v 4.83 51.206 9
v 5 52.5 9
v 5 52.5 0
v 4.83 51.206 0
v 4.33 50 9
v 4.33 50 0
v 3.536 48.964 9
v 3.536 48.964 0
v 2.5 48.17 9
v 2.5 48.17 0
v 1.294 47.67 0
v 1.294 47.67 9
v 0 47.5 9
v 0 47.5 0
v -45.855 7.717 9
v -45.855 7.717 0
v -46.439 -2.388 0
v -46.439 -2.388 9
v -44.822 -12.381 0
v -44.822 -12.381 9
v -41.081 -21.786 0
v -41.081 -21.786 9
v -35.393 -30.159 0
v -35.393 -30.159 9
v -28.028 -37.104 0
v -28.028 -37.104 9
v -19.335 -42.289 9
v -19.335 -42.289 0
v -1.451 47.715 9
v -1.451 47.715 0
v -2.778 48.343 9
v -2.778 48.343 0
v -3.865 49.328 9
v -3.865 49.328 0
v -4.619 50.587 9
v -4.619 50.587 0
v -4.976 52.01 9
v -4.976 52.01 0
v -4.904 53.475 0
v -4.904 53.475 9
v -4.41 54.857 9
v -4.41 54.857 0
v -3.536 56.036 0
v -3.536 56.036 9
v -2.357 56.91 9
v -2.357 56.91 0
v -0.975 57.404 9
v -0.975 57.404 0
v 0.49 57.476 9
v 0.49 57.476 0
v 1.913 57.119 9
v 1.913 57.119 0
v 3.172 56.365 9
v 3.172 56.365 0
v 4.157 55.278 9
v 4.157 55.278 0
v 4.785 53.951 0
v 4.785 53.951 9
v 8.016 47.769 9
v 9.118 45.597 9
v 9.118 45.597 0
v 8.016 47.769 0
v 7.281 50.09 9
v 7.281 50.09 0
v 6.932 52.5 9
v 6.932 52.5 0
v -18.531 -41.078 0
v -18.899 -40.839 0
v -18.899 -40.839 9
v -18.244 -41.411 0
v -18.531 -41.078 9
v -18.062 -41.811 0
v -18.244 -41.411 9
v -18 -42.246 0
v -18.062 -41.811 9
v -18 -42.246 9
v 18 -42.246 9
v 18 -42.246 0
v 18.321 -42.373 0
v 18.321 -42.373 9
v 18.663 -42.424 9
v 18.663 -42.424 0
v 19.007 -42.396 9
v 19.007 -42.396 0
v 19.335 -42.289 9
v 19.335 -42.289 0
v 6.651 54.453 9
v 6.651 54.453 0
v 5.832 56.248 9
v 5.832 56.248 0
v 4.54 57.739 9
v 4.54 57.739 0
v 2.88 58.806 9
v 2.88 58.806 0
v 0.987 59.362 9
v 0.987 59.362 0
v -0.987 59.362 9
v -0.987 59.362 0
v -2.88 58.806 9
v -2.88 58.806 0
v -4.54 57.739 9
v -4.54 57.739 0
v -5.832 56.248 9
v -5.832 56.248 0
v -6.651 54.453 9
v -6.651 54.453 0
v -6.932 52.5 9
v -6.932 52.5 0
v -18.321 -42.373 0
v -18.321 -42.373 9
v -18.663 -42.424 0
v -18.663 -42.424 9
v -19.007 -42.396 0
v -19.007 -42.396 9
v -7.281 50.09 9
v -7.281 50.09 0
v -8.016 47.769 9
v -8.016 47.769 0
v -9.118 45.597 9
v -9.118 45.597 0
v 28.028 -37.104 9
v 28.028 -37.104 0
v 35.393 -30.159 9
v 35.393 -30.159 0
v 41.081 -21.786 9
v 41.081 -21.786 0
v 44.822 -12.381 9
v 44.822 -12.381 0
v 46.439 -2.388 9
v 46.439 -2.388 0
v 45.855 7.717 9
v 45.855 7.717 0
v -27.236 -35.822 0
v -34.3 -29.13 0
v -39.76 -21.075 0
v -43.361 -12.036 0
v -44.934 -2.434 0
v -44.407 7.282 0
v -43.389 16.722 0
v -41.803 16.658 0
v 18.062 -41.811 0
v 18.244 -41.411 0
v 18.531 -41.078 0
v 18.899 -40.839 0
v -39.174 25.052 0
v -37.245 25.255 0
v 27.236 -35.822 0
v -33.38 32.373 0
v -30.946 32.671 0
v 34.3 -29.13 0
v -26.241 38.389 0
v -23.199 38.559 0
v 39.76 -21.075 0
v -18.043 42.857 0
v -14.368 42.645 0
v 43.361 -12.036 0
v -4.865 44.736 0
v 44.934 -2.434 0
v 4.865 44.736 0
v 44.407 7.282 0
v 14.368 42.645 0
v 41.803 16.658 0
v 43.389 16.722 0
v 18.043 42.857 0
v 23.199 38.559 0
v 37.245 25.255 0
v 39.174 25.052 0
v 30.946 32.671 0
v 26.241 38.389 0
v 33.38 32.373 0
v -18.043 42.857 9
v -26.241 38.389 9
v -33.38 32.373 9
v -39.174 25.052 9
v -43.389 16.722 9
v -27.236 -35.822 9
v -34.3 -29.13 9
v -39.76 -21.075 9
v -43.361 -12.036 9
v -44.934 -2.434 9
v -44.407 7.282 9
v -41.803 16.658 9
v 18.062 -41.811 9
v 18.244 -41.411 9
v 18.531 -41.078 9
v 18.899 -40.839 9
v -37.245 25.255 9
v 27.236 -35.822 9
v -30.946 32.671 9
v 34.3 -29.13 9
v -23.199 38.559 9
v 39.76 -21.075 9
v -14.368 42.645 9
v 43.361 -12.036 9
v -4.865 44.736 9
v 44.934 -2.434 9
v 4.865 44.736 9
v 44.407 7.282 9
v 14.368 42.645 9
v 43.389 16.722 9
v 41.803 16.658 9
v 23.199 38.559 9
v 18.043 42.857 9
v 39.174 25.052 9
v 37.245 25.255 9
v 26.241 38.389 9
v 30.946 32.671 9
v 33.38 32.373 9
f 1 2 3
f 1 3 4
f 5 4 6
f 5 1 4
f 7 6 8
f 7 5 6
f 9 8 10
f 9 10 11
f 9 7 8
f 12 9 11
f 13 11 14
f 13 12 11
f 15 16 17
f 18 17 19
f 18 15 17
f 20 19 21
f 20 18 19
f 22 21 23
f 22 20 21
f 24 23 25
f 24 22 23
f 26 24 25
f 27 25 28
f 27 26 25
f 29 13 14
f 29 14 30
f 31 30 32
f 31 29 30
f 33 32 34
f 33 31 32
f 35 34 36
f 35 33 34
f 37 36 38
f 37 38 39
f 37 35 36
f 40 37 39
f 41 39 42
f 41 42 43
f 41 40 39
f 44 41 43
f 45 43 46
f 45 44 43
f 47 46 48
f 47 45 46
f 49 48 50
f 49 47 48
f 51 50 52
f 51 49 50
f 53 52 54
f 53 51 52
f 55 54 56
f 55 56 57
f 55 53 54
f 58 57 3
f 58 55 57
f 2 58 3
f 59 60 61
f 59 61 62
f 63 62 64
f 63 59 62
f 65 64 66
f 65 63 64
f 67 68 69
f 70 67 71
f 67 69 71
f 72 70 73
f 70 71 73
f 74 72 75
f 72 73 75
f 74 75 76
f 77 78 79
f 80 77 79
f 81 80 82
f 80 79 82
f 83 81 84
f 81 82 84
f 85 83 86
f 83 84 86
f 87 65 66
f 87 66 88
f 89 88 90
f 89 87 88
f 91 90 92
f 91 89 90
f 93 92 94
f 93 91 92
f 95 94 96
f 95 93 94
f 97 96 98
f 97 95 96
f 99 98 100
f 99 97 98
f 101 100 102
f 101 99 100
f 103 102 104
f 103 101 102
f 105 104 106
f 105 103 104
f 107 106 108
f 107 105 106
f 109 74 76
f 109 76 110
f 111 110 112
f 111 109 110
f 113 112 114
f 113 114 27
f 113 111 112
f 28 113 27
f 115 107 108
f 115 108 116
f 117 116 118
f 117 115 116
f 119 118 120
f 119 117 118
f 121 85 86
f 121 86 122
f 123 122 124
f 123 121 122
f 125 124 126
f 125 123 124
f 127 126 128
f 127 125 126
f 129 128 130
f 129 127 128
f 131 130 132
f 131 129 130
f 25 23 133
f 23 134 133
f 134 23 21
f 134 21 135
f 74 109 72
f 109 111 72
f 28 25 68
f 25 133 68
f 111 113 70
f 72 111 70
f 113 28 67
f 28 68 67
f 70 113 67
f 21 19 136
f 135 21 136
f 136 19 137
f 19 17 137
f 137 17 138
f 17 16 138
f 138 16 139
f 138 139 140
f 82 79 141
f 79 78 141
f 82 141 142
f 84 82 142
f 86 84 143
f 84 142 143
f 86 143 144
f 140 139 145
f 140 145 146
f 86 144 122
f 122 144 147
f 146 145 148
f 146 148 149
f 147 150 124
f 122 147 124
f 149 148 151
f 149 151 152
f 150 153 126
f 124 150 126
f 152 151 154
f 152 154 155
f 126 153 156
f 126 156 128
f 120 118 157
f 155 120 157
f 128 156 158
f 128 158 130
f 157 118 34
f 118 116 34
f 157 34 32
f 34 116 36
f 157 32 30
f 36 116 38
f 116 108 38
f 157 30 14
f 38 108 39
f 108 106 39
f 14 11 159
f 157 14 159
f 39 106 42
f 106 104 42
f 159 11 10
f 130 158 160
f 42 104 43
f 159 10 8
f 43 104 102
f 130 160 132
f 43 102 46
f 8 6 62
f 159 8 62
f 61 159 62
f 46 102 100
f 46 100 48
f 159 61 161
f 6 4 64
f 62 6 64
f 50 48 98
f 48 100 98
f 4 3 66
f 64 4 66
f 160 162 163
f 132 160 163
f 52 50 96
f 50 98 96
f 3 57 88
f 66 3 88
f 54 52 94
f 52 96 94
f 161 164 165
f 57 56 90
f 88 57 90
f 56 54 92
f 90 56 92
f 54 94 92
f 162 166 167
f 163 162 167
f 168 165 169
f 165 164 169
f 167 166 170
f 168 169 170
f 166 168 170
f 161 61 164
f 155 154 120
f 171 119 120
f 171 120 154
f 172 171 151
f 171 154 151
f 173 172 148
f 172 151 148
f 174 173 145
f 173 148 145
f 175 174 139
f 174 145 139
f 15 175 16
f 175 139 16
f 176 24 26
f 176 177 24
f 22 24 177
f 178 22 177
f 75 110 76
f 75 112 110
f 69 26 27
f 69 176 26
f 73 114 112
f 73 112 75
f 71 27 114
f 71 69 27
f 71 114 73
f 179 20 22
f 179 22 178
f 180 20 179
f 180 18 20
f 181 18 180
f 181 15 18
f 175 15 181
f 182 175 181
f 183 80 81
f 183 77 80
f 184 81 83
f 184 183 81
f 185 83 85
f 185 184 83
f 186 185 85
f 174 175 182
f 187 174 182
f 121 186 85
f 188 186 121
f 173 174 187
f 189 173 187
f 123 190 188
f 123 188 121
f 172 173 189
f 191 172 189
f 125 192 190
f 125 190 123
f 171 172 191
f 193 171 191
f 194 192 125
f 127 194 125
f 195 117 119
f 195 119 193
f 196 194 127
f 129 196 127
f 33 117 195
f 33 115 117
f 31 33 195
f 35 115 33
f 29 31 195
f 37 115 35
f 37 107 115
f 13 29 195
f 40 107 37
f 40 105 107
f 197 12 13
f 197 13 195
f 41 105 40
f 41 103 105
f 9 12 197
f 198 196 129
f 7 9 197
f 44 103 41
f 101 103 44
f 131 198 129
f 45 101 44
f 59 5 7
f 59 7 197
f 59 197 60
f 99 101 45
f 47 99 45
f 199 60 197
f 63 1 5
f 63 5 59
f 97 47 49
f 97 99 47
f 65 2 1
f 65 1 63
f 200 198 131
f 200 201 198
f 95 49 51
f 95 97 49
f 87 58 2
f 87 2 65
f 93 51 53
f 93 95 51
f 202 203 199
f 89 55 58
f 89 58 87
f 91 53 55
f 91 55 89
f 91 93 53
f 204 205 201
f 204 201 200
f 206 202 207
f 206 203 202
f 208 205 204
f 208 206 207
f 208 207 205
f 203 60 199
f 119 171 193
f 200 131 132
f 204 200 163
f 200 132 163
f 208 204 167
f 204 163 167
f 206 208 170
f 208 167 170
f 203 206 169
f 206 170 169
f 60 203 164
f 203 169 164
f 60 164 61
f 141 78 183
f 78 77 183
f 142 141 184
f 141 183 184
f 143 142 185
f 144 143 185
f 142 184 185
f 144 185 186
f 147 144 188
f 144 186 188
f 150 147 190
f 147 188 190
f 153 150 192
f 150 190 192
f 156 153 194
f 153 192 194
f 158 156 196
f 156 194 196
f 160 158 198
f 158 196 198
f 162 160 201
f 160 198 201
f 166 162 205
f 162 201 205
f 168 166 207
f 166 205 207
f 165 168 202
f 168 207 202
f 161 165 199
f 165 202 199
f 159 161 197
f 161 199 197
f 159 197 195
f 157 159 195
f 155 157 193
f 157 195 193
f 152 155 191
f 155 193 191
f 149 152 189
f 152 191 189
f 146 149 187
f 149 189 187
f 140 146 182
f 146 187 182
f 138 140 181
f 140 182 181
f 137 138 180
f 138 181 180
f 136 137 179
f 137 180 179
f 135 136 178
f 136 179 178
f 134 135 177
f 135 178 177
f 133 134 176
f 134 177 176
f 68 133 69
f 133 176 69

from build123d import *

# Parameters (mm, degrees)
F0_R         = 46.5
F0_R_2       = 45
F1_DEPTH     = 9
F3_DEPTH     = 25
F5_DEPTH     = 25
F7_DEPTH     = 9
F9_DEPTH     = 9
F11_DEPTH    = 9
F13_DEPTH    = 25
F15_DEPTH    = 25
F16_R        = 45
F17_DEPTH    = 9
F18_R        = 45
F19_DEPTH    = 25
F21_DEPTH    = 25
F22_R        = 1.55
F23_T1_DEPTH = 16.2900218994
F24_T1_DEPTH = 16.2900218994


# Not quite as in the source:
# - a fillet or chamfer that OpenCascade refuses, or shapes differently, is made with other operations: its cross-section is extruded or revolved along the edge and cut away or added


with BuildPart() as f1:
    # F0 (on Top) → F1 (new body)
    with BuildSketch(Plane.XY):
        Circle(F0_R)
        Circle(F0_R_2, mode=Mode.SUBTRACT)
    extrude(amount=F1_DEPTH)

    # F2 (on face) → F3 (cut)
    with BuildSketch(Plane.XY.offset(9)):
        Polygon((64.8135244846, -21.5104352683), (0, -21.5104352683), (-51.5724048018, -21.5104352683), (-51.5724048018, -59.9158406258), (64.033716917, -57.7713772655), align=None)
    extrude(amount=-F3_DEPTH, mode=Mode.SUBTRACT)

    # F4 (on face) → F5 (cut)
    with BuildSketch(Plane.XY.offset(9)):
        with BuildLine():
            ThreePointArc((-40.5525222975, -19.506228116), (-40.9032938672, -20.5072072896), (-41.9042730407, -20.1564357199))
            Line((-41.9042730407, -20.1564357199), (-43.4346050024, -22.7221362293))
            Line((-43.4346050024, -22.7221362293), (-36.3525599241, -23.4547629952))
            Line((-36.3525599241, -23.4547629952), (-40.5525222975, -19.506228116))
        make_face()
        with BuildLine():
            Line((43.4346050024, -22.7221362293), (41.9042730407, -20.1564357199))
            ThreePointArc((41.9042730407, -20.1564357199), (40.9032938672, -20.5072072896), (40.5525222975, -19.506228116))
            Line((40.5525222975, -19.506228116), (36.3525599241, -23.4547629952))
            Line((36.3525599241, -23.4547629952), (43.4346050024, -22.7221362293))
        make_face()
    extrude(amount=-F5_DEPTH, mode=Mode.SUBTRACT)

    # F6 (on face) → F7 (join)
    with BuildSketch(Plane.XY.offset(9)):
        with BuildLine():
            ThreePointArc((6.9320949163, 52.5), (-4.9017313232, 57.4017313232), (0, 45.5679050837))
            ThreePointArc((0, 45.5679050837), (4.9017313232, 47.5982686768), (6.9320949163, 52.5))
        make_face()
        with BuildLine():
            ThreePointArc((5, 52.5), (3.5355339059, 48.9644660941), (0, 47.5))
            ThreePointArc((0, 47.5), (-3.5355339059, 56.0355339059), (5, 52.5))
        make_face(mode=Mode.SUBTRACT)
    extrude(amount=-F7_DEPTH)

    # F8 (on face) → F9 (join)
    with BuildSketch(Plane.XY.offset(9)):
        with BuildLine():
            ThreePointArc((-6.9320949163, 52.5), (-7.6007884485, 48.9142518774), (-9.1181185374, 45.5972577502))
            ThreePointArc((-9.1181185374, 45.5972577502), (0, 45.60976302), (9.1181185374, 45.5972577502))
            ThreePointArc((9.1181185374, 45.5972577502), (7.6007884485, 48.9142518774), (6.9320949163, 52.5))
            ThreePointArc((6.9320949163, 52.5), (0, 47.0015761941), (-6.9320949163, 52.5))
        make_face()
    extrude(amount=-F9_DEPTH)

    # F10 (on face) → F11 (join)
    with BuildSketch(Plane.XY.offset(9)):
        with BuildLine():
            Line((-44.8310511788, 3.895747708), (-46.3451584316, 3.7916078319))
            ThreePointArc((-46.3451584316, 3.7916078319), (-42.7926175487, -9.5215818837), (-33.8443815708, -19.9996847659))
            ThreePointArc((-33.8443815708, -19.9996847659), (-32.8631083129, -20.2138563114), (-32.1503467858, -19.506228116))
            ThreePointArc((-32.1503467858, -19.506228116), (-41.2777702931, -9.315455738), (-44.8310511788, 3.895747708))
        make_face()
        with BuildLine():
            ThreePointArc((33.8443815708, -19.9996847659), (42.7926175487, -9.5215818837), (46.3451584316, 3.7916078319))
            Line((46.3451584316, 3.7916078319), (44.8310511788, 3.895747708))
            ThreePointArc((44.8310511788, 3.895747708), (41.2777702931, -9.315455738), (32.1503467858, -19.506228116))
            ThreePointArc((32.1503467858, -19.506228116), (32.8631083129, -20.2138563114), (33.8443815708, -19.9996847659))
        make_face()
    extrude(amount=-F11_DEPTH)

    # F12 (on face) → F13 (cut)
    with BuildSketch(Plane.XY.offset(9)):
        with BuildLine():
            ThreePointArc((-44.7172397739, -5.0367119241), (-45.830770977, -0.896267065), (-46.3787269492, 3.35614162))
            Line((-46.3787269492, 3.35614162), (-53.9689548314, -20.3920416534))
            Line((-53.9689548314, -20.3920416534), (-39.6306179464, -26.7084874213))
            Line((-39.6306179464, -26.7084874213), (-35.9670780599, -21.9711512327))
            Line((-35.9670780599, -21.9711512327), (-43.2941578329, -10.1593965665))
            Line((-43.2941578329, -10.1593965665), (-44.7172397739, -5.0367119241))
        make_face()
        with BuildLine():
            Line((53.9689548314, -20.3920416534), (46.3787269492, 3.35614162))
            ThreePointArc((46.3787269492, 3.35614162), (45.830770977, -0.896267065), (44.7172397739, -5.0367119241))
            Line((44.7172397739, -5.0367119241), (43.2941578329, -10.1593965665))
            Line((43.2941578329, -10.1593965665), (35.9670780599, -21.9711512327))
            Line((35.9670780599, -21.9711512327), (39.6306179464, -26.7084874213))
            Line((39.6306179464, -26.7084874213), (53.9689548314, -20.3920416534))
        make_face()
    extrude(amount=-F13_DEPTH, mode=Mode.SUBTRACT)

    # F14 (on face) → F15 (cut)
    with BuildSketch(Plane.XY.offset(9)):
        with BuildLine():
            ThreePointArc((-45.7581778434, -1.2523031469), (-46.1397679432, 3.2286956321), (-45.8552008738, 7.7169004675))
            ThreePointArc((-45.8552008738, 7.7169004675), (-48.5264373147, 3.20287819), (-45.7581778434, -1.2523031469))
        make_face()
        with BuildLine():
            ThreePointArc((45.7581778434, -1.2523031469), (48.5264373147, 3.20287819), (45.8552008738, 7.7169004675))
            ThreePointArc((45.8552008738, 7.7169004675), (46.1397679432, 3.2286956321), (45.7581778434, -1.2523031469))
        make_face()
    extrude(amount=-F15_DEPTH, mode=Mode.SUBTRACT)

    # F16 (on face) → F17 (join)
    with BuildSketch(Plane.XY.offset(9)):
        with BuildLine():
            ThreePointArc((-9.1181185374, 45.5972577502), (0, -46.5), (9.1181185374, 45.5972577502))
            ThreePointArc((9.1181185374, 45.5972577502), (0, 46.5), (-9.1181185374, 45.5972577502))
        make_face()
        Circle(F16_R, mode=Mode.SUBTRACT)
    extrude(amount=-F17_DEPTH)

    # F18 (on face) → F19 (cut)
    with BuildSketch(Plane.XY.offset(9)):
        Circle(F18_R)
    extrude(amount=-F19_DEPTH, mode=Mode.SUBTRACT)

    # F20 (on face) → F21 (cut)
    with BuildSketch(Plane.XY.offset(9)):
        Polygon((18, 0), (0, 0), (-18, 0), (-18, -69.9843019247), (18, -69.3941116333), align=None)
    extrude(amount=-F21_DEPTH, mode=Mode.SUBTRACT)

    # F22
    f22_edges = [f1.edges().sort_by_distance(p)[0] for p in [
        (-18, -41.243181, 4.5),
        (18, -41.243181, 4.5),
    ]]
    fillet(f22_edges, radius=F22_R)

    # F23: fillet of radius 1.5 on 1 edges, made by hand

    # F23_s2 → F23_t1 (cut)
    with BuildSketch(Plane.XY.offset(-3.6450109497)):
        with BuildLine():
            ThreePointArc((18, -42.2457098414), (18.6625262969, -42.4244445619), (19.3353236307, -42.2894225557))
            ThreePointArc((19.3353236307, -42.2894225557), (18.6699563348, -42.5873541143), (18, -42.8748177839))
            Line((18, -42.8748177839), (18, -42.2457098414))
        make_face()
    extrude(amount=F23_T1_DEPTH, mode=Mode.SUBTRACT)

    # F24: fillet of radius 1.5 on 1 edges, made by hand

    # F24_s2 → F24_t1 (cut)
    with BuildSketch(Plane.XY.offset(-3.6450109497)):
        with BuildLine():
            ThreePointArc((-18, -42.2457098414), (-18.6625262969, -42.4244445619), (-19.3353236307, -42.2894225557))
            ThreePointArc((-19.3353236307, -42.2894225557), (-18.6699563348, -42.5873541143), (-18, -42.8748177839))
            Line((-18, -42.8748177839), (-18, -42.2457098414))
        make_face()
    extrude(amount=F24_T1_DEPTH, mode=Mode.SUBTRACT)


solid = f1.part
